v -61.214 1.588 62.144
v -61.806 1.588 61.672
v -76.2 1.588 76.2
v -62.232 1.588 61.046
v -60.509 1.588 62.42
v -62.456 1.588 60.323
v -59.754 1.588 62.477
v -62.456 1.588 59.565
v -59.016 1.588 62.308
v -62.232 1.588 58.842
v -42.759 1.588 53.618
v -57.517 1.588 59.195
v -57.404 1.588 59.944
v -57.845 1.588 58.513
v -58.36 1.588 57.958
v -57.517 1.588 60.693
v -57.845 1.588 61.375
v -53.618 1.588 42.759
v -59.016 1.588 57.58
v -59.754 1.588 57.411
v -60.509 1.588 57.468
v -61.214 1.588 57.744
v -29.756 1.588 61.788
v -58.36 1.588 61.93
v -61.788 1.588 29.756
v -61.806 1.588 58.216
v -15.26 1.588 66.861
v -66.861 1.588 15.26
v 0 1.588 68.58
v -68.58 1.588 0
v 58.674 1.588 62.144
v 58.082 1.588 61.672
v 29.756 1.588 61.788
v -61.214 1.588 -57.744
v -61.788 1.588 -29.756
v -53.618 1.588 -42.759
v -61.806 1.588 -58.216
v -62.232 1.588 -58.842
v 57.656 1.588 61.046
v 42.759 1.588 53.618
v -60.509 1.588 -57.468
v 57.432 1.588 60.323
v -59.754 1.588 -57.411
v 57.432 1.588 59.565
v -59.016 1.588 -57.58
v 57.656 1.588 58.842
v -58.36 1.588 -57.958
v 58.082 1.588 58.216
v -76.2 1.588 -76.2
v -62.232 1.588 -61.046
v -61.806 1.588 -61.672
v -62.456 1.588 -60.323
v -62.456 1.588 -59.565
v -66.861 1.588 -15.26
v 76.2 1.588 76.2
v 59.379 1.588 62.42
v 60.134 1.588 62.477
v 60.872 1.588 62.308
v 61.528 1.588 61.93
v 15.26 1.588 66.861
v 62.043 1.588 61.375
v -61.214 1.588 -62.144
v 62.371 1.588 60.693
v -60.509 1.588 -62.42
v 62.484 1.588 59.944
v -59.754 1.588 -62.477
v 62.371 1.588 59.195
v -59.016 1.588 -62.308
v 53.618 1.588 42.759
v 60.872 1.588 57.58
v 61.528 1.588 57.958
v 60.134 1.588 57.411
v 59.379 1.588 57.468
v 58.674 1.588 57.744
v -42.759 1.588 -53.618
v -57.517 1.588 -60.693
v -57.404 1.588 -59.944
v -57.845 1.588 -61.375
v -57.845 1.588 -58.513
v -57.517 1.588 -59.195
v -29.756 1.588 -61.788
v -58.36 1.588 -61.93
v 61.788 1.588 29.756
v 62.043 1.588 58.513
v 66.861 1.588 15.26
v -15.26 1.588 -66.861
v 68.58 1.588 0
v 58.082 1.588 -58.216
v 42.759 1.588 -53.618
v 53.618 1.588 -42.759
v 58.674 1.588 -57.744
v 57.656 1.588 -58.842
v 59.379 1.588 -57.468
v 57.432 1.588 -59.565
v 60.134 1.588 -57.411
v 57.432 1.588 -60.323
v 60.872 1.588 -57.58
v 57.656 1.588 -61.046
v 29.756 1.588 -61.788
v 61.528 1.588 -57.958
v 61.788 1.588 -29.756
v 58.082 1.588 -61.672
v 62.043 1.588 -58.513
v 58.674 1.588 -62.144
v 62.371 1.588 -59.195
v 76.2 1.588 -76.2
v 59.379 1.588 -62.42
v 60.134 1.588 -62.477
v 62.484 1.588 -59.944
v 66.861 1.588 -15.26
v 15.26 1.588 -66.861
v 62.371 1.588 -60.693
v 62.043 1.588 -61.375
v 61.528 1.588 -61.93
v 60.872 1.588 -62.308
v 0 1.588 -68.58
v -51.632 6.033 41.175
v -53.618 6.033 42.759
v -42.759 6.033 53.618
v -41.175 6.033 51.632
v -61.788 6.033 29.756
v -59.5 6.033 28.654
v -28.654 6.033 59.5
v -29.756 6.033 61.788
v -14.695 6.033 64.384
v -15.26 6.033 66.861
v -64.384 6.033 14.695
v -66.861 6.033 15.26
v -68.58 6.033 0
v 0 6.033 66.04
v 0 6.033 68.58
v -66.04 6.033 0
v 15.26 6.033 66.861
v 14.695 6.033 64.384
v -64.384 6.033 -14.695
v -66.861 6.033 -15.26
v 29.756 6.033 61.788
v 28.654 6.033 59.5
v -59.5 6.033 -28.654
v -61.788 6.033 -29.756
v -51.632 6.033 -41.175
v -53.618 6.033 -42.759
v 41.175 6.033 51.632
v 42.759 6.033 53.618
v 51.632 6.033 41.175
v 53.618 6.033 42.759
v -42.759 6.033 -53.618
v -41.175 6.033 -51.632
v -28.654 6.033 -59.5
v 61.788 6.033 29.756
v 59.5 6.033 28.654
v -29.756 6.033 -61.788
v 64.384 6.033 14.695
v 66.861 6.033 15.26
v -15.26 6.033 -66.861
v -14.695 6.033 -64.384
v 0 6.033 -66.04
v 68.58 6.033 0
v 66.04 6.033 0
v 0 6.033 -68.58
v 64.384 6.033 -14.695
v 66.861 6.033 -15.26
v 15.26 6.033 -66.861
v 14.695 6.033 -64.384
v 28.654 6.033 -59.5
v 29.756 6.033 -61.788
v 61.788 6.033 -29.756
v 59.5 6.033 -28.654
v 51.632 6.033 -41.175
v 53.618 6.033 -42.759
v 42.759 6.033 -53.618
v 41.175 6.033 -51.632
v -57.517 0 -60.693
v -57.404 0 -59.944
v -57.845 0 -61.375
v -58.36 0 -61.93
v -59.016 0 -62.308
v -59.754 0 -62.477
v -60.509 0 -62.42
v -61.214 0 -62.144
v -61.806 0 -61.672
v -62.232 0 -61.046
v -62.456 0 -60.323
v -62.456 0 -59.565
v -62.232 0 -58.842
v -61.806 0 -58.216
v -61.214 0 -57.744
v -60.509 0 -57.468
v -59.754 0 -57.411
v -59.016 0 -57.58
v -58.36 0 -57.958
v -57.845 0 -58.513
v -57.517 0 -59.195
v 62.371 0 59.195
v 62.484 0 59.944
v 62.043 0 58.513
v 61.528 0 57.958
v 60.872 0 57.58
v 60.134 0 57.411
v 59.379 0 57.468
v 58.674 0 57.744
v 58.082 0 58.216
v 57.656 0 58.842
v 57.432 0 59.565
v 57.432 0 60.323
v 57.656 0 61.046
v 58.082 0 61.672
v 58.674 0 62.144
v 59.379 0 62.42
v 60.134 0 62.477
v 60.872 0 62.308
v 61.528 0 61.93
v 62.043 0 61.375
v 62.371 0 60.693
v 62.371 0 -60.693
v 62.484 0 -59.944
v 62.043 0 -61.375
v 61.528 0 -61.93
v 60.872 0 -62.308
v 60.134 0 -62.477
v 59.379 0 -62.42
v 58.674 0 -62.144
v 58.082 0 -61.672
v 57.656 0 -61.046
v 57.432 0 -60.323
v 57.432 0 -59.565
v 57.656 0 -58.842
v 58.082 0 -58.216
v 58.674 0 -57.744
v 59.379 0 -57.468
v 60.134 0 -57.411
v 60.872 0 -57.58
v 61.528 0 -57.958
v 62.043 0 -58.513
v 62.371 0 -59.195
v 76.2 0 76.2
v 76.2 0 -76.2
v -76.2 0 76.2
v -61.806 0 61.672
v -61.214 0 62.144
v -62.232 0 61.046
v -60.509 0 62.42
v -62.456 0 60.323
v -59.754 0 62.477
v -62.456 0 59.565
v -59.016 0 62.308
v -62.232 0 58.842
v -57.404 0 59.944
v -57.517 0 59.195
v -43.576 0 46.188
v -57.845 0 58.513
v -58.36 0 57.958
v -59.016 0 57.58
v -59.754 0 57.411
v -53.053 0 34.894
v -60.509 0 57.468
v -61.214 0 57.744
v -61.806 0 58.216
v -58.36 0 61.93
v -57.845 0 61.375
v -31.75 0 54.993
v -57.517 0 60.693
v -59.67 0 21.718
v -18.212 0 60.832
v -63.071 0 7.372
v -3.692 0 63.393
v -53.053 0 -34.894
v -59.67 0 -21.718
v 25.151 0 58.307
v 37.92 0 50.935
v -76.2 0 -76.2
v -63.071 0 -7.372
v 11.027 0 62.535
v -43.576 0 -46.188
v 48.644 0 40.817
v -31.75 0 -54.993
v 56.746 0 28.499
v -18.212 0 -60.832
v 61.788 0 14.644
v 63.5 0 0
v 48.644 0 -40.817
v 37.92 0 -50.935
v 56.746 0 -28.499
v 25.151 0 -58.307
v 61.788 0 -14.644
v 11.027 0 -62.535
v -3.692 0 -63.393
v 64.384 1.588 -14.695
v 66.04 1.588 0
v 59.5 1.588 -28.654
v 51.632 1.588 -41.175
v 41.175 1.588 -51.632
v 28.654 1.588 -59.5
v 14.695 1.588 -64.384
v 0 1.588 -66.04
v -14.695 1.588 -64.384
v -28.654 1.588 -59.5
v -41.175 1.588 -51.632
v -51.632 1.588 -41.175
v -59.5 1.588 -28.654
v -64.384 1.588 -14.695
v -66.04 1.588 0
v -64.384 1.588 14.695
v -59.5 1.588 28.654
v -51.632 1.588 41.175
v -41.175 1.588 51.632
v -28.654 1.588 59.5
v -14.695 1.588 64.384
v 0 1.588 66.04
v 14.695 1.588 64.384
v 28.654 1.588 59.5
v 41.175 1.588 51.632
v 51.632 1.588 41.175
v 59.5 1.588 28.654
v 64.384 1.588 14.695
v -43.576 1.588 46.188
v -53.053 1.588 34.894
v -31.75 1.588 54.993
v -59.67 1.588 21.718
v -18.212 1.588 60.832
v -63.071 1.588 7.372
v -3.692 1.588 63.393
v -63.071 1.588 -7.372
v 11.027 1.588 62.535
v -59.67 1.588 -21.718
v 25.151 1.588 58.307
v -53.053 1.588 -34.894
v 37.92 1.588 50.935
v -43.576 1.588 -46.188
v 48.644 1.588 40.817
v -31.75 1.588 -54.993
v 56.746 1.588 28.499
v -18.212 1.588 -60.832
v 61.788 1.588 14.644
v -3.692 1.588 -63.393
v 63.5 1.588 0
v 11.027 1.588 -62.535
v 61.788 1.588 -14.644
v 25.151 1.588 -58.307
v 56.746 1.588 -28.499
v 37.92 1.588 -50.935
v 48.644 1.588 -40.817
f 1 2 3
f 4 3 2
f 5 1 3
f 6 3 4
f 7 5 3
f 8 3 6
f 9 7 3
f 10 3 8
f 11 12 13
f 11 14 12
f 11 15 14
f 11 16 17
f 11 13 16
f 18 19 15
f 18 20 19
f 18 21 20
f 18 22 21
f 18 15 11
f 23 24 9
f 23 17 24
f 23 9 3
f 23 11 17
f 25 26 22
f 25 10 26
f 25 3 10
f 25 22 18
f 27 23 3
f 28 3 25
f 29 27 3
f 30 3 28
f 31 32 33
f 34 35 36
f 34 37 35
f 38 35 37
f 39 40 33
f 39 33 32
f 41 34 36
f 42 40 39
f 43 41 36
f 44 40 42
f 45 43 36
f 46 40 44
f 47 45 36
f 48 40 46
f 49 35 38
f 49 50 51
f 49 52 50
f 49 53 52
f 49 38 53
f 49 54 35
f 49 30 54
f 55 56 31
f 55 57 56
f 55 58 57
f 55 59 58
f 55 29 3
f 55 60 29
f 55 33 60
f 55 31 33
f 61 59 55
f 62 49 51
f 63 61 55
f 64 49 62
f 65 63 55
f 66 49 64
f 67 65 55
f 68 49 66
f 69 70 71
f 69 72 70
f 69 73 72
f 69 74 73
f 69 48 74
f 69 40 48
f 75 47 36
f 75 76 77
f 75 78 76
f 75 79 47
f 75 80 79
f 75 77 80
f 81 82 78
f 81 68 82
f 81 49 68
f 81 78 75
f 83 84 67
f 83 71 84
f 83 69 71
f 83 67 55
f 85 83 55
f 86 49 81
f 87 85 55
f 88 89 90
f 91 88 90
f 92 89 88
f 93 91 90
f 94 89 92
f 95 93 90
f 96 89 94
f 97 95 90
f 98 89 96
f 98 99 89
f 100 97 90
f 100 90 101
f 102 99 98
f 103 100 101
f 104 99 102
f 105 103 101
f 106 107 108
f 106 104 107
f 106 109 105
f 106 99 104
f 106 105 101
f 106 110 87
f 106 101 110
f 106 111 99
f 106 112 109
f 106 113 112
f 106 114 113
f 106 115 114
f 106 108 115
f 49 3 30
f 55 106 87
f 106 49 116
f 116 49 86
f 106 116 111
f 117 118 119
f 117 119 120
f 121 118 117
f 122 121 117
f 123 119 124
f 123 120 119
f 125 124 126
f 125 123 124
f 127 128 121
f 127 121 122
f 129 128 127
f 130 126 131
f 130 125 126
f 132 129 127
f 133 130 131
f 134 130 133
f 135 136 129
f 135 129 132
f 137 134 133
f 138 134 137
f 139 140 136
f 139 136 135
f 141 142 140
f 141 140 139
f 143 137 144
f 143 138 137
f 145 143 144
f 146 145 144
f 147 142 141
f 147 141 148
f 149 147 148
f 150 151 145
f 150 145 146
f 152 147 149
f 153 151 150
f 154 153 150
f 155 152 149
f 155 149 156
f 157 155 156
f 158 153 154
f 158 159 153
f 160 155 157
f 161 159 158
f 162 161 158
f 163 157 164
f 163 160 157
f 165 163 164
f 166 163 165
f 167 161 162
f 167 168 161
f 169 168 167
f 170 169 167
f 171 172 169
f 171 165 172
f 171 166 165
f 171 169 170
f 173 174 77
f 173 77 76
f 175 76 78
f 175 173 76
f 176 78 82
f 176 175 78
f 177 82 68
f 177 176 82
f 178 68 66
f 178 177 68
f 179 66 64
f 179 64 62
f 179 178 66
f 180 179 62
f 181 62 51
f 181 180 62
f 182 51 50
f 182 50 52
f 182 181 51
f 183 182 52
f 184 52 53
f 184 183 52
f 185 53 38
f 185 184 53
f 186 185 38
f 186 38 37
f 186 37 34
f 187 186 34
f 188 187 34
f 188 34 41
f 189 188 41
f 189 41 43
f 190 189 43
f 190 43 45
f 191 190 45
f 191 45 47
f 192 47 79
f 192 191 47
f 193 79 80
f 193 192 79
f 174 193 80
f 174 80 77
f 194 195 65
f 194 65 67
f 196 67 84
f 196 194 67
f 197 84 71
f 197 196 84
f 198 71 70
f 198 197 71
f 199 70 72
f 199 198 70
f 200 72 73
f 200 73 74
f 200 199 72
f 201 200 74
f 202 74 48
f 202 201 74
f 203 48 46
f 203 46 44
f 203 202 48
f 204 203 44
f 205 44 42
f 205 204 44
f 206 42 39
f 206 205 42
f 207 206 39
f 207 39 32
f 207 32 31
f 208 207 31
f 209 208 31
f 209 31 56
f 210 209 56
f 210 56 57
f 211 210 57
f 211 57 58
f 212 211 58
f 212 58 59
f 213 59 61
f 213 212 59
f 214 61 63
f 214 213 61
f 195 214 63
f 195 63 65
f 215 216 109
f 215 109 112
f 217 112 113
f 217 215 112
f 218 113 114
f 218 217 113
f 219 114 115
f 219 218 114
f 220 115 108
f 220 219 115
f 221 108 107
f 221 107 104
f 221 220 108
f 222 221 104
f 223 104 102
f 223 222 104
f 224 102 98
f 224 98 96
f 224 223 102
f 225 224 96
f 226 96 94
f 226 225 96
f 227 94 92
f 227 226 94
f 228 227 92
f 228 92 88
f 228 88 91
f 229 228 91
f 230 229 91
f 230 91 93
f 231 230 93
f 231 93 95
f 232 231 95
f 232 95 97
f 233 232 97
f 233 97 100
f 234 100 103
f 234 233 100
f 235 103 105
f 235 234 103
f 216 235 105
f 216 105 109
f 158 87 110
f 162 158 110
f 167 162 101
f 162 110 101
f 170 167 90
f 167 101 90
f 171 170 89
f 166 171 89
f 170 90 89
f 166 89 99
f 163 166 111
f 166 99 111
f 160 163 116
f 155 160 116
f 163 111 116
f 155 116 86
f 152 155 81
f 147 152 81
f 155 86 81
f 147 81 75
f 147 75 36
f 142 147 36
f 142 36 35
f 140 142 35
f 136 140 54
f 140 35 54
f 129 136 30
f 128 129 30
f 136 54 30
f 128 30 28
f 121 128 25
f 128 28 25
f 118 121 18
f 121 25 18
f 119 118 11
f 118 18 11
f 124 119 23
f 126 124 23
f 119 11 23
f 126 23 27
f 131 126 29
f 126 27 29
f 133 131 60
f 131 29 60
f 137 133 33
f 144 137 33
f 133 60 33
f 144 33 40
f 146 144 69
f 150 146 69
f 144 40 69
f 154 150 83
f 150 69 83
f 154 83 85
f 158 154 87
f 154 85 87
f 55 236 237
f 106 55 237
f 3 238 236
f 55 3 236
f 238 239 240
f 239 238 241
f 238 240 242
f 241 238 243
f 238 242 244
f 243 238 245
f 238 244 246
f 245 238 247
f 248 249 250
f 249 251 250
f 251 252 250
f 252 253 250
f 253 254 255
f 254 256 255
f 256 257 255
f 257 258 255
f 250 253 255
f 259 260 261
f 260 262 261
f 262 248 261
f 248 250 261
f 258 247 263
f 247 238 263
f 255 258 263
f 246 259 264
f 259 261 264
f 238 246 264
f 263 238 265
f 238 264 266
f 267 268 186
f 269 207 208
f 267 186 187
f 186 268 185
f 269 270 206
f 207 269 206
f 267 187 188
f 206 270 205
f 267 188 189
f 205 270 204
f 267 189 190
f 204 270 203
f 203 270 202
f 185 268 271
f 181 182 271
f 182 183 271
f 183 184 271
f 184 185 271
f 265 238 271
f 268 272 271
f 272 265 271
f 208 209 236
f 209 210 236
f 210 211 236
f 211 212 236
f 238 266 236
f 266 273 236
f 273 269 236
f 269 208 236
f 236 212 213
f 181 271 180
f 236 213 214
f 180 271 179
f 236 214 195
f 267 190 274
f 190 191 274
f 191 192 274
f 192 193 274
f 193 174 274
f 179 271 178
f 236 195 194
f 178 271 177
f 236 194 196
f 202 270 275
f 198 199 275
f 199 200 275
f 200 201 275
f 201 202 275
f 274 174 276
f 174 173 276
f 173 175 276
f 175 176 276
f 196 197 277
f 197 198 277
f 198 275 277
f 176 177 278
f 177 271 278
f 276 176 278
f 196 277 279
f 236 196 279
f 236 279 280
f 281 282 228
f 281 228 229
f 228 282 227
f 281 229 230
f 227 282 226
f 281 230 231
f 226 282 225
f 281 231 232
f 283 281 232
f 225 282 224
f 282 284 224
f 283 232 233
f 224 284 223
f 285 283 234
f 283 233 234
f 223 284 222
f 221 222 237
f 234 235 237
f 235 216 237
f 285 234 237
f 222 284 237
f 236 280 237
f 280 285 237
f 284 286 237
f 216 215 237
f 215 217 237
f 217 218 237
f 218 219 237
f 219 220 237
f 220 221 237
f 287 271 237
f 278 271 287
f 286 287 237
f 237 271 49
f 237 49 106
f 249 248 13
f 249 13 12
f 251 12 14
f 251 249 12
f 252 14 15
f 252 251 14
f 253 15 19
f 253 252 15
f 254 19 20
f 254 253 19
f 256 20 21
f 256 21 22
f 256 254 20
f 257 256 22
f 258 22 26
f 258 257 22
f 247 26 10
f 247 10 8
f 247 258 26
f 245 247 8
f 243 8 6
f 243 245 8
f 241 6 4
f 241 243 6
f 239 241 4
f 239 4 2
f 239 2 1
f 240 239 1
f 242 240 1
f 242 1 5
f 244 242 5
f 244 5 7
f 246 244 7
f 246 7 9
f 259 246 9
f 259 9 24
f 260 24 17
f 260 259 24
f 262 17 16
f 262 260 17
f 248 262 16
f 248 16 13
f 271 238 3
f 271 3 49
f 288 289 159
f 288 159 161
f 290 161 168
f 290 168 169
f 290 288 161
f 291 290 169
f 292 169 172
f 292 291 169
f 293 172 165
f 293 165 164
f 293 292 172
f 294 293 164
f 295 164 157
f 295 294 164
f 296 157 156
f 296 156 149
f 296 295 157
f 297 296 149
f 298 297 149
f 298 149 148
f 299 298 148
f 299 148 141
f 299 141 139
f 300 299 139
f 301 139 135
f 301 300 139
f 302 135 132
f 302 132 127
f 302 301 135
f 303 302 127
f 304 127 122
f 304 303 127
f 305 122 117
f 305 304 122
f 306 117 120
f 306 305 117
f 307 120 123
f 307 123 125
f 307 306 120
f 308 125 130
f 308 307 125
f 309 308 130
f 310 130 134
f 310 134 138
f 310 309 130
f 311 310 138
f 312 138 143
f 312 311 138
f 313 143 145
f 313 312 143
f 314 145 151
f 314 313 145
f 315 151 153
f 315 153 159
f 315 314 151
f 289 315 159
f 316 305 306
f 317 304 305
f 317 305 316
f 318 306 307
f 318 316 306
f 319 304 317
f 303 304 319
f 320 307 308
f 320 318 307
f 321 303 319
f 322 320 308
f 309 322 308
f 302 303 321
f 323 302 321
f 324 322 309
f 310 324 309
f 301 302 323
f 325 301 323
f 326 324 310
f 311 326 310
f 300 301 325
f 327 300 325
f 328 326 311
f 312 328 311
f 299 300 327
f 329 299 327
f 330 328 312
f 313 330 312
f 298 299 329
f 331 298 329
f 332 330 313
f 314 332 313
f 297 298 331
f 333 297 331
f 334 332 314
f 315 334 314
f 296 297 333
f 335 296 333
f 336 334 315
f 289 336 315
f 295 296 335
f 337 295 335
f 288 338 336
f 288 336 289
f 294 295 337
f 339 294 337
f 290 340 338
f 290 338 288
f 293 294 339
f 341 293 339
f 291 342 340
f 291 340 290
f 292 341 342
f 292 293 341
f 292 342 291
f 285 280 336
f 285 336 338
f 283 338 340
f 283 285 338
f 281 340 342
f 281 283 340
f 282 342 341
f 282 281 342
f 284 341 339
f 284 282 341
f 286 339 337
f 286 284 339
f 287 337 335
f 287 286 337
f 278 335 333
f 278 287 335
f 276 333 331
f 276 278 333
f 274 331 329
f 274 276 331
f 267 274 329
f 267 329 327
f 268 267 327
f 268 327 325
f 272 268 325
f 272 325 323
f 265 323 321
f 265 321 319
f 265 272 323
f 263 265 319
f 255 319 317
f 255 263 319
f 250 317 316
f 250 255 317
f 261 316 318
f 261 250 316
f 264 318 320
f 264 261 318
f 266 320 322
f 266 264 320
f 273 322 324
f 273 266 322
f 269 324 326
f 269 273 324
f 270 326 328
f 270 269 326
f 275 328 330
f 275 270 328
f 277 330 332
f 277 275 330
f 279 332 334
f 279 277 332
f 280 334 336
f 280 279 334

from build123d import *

# Parameters (mm, degrees)
SKETCH1_W           = 152.4
SKETCH1_H           = 152.4
SKETCH1_R           = 63.5
SKETCH1_R_2         = 2.54
BOSS_EXTRUDE1_DEPTH = 1.5875
SKETCH2_R           = 68.58
SKETCH2_R_2         = 66.04
BOSS_EXTRUDE2_DEPTH = 4.445


with BuildPart() as part:
    # Sketch1 → Boss-Extrude1 (new body)
    with BuildSketch(Plane(origin=(0, 0, 0), x_dir=(1, 0, 0), z_dir=(0, 1, 0))):
        Rectangle(SKETCH1_W, SKETCH1_H)
        Circle(SKETCH1_R, mode=Mode.SUBTRACT)
        with Locations((-59.944, 59.944)):
            Circle(SKETCH1_R_2, mode=Mode.SUBTRACT)
        with Locations((59.944, 59.944)):
            Circle(SKETCH1_R_2, mode=Mode.SUBTRACT)
        with Locations((59.944, -59.944)):
            Circle(SKETCH1_R_2, mode=Mode.SUBTRACT)
        with Locations((-59.944, -59.944)):
            Circle(SKETCH1_R_2, mode=Mode.SUBTRACT)
    extrude(amount=BOSS_EXTRUDE1_DEPTH)

    # Sketch2 → Boss-Extrude2 (add)
    with BuildSketch(Plane(origin=(0, 1.5875, 0), x_dir=(1, 0, 0), z_dir=(0, 1, 0))):
        Circle(SKETCH2_R)
        Circle(SKETCH2_R_2, mode=Mode.SUBTRACT)
    extrude(amount=BOSS_EXTRUDE2_DEPTH)


solid = part.part
